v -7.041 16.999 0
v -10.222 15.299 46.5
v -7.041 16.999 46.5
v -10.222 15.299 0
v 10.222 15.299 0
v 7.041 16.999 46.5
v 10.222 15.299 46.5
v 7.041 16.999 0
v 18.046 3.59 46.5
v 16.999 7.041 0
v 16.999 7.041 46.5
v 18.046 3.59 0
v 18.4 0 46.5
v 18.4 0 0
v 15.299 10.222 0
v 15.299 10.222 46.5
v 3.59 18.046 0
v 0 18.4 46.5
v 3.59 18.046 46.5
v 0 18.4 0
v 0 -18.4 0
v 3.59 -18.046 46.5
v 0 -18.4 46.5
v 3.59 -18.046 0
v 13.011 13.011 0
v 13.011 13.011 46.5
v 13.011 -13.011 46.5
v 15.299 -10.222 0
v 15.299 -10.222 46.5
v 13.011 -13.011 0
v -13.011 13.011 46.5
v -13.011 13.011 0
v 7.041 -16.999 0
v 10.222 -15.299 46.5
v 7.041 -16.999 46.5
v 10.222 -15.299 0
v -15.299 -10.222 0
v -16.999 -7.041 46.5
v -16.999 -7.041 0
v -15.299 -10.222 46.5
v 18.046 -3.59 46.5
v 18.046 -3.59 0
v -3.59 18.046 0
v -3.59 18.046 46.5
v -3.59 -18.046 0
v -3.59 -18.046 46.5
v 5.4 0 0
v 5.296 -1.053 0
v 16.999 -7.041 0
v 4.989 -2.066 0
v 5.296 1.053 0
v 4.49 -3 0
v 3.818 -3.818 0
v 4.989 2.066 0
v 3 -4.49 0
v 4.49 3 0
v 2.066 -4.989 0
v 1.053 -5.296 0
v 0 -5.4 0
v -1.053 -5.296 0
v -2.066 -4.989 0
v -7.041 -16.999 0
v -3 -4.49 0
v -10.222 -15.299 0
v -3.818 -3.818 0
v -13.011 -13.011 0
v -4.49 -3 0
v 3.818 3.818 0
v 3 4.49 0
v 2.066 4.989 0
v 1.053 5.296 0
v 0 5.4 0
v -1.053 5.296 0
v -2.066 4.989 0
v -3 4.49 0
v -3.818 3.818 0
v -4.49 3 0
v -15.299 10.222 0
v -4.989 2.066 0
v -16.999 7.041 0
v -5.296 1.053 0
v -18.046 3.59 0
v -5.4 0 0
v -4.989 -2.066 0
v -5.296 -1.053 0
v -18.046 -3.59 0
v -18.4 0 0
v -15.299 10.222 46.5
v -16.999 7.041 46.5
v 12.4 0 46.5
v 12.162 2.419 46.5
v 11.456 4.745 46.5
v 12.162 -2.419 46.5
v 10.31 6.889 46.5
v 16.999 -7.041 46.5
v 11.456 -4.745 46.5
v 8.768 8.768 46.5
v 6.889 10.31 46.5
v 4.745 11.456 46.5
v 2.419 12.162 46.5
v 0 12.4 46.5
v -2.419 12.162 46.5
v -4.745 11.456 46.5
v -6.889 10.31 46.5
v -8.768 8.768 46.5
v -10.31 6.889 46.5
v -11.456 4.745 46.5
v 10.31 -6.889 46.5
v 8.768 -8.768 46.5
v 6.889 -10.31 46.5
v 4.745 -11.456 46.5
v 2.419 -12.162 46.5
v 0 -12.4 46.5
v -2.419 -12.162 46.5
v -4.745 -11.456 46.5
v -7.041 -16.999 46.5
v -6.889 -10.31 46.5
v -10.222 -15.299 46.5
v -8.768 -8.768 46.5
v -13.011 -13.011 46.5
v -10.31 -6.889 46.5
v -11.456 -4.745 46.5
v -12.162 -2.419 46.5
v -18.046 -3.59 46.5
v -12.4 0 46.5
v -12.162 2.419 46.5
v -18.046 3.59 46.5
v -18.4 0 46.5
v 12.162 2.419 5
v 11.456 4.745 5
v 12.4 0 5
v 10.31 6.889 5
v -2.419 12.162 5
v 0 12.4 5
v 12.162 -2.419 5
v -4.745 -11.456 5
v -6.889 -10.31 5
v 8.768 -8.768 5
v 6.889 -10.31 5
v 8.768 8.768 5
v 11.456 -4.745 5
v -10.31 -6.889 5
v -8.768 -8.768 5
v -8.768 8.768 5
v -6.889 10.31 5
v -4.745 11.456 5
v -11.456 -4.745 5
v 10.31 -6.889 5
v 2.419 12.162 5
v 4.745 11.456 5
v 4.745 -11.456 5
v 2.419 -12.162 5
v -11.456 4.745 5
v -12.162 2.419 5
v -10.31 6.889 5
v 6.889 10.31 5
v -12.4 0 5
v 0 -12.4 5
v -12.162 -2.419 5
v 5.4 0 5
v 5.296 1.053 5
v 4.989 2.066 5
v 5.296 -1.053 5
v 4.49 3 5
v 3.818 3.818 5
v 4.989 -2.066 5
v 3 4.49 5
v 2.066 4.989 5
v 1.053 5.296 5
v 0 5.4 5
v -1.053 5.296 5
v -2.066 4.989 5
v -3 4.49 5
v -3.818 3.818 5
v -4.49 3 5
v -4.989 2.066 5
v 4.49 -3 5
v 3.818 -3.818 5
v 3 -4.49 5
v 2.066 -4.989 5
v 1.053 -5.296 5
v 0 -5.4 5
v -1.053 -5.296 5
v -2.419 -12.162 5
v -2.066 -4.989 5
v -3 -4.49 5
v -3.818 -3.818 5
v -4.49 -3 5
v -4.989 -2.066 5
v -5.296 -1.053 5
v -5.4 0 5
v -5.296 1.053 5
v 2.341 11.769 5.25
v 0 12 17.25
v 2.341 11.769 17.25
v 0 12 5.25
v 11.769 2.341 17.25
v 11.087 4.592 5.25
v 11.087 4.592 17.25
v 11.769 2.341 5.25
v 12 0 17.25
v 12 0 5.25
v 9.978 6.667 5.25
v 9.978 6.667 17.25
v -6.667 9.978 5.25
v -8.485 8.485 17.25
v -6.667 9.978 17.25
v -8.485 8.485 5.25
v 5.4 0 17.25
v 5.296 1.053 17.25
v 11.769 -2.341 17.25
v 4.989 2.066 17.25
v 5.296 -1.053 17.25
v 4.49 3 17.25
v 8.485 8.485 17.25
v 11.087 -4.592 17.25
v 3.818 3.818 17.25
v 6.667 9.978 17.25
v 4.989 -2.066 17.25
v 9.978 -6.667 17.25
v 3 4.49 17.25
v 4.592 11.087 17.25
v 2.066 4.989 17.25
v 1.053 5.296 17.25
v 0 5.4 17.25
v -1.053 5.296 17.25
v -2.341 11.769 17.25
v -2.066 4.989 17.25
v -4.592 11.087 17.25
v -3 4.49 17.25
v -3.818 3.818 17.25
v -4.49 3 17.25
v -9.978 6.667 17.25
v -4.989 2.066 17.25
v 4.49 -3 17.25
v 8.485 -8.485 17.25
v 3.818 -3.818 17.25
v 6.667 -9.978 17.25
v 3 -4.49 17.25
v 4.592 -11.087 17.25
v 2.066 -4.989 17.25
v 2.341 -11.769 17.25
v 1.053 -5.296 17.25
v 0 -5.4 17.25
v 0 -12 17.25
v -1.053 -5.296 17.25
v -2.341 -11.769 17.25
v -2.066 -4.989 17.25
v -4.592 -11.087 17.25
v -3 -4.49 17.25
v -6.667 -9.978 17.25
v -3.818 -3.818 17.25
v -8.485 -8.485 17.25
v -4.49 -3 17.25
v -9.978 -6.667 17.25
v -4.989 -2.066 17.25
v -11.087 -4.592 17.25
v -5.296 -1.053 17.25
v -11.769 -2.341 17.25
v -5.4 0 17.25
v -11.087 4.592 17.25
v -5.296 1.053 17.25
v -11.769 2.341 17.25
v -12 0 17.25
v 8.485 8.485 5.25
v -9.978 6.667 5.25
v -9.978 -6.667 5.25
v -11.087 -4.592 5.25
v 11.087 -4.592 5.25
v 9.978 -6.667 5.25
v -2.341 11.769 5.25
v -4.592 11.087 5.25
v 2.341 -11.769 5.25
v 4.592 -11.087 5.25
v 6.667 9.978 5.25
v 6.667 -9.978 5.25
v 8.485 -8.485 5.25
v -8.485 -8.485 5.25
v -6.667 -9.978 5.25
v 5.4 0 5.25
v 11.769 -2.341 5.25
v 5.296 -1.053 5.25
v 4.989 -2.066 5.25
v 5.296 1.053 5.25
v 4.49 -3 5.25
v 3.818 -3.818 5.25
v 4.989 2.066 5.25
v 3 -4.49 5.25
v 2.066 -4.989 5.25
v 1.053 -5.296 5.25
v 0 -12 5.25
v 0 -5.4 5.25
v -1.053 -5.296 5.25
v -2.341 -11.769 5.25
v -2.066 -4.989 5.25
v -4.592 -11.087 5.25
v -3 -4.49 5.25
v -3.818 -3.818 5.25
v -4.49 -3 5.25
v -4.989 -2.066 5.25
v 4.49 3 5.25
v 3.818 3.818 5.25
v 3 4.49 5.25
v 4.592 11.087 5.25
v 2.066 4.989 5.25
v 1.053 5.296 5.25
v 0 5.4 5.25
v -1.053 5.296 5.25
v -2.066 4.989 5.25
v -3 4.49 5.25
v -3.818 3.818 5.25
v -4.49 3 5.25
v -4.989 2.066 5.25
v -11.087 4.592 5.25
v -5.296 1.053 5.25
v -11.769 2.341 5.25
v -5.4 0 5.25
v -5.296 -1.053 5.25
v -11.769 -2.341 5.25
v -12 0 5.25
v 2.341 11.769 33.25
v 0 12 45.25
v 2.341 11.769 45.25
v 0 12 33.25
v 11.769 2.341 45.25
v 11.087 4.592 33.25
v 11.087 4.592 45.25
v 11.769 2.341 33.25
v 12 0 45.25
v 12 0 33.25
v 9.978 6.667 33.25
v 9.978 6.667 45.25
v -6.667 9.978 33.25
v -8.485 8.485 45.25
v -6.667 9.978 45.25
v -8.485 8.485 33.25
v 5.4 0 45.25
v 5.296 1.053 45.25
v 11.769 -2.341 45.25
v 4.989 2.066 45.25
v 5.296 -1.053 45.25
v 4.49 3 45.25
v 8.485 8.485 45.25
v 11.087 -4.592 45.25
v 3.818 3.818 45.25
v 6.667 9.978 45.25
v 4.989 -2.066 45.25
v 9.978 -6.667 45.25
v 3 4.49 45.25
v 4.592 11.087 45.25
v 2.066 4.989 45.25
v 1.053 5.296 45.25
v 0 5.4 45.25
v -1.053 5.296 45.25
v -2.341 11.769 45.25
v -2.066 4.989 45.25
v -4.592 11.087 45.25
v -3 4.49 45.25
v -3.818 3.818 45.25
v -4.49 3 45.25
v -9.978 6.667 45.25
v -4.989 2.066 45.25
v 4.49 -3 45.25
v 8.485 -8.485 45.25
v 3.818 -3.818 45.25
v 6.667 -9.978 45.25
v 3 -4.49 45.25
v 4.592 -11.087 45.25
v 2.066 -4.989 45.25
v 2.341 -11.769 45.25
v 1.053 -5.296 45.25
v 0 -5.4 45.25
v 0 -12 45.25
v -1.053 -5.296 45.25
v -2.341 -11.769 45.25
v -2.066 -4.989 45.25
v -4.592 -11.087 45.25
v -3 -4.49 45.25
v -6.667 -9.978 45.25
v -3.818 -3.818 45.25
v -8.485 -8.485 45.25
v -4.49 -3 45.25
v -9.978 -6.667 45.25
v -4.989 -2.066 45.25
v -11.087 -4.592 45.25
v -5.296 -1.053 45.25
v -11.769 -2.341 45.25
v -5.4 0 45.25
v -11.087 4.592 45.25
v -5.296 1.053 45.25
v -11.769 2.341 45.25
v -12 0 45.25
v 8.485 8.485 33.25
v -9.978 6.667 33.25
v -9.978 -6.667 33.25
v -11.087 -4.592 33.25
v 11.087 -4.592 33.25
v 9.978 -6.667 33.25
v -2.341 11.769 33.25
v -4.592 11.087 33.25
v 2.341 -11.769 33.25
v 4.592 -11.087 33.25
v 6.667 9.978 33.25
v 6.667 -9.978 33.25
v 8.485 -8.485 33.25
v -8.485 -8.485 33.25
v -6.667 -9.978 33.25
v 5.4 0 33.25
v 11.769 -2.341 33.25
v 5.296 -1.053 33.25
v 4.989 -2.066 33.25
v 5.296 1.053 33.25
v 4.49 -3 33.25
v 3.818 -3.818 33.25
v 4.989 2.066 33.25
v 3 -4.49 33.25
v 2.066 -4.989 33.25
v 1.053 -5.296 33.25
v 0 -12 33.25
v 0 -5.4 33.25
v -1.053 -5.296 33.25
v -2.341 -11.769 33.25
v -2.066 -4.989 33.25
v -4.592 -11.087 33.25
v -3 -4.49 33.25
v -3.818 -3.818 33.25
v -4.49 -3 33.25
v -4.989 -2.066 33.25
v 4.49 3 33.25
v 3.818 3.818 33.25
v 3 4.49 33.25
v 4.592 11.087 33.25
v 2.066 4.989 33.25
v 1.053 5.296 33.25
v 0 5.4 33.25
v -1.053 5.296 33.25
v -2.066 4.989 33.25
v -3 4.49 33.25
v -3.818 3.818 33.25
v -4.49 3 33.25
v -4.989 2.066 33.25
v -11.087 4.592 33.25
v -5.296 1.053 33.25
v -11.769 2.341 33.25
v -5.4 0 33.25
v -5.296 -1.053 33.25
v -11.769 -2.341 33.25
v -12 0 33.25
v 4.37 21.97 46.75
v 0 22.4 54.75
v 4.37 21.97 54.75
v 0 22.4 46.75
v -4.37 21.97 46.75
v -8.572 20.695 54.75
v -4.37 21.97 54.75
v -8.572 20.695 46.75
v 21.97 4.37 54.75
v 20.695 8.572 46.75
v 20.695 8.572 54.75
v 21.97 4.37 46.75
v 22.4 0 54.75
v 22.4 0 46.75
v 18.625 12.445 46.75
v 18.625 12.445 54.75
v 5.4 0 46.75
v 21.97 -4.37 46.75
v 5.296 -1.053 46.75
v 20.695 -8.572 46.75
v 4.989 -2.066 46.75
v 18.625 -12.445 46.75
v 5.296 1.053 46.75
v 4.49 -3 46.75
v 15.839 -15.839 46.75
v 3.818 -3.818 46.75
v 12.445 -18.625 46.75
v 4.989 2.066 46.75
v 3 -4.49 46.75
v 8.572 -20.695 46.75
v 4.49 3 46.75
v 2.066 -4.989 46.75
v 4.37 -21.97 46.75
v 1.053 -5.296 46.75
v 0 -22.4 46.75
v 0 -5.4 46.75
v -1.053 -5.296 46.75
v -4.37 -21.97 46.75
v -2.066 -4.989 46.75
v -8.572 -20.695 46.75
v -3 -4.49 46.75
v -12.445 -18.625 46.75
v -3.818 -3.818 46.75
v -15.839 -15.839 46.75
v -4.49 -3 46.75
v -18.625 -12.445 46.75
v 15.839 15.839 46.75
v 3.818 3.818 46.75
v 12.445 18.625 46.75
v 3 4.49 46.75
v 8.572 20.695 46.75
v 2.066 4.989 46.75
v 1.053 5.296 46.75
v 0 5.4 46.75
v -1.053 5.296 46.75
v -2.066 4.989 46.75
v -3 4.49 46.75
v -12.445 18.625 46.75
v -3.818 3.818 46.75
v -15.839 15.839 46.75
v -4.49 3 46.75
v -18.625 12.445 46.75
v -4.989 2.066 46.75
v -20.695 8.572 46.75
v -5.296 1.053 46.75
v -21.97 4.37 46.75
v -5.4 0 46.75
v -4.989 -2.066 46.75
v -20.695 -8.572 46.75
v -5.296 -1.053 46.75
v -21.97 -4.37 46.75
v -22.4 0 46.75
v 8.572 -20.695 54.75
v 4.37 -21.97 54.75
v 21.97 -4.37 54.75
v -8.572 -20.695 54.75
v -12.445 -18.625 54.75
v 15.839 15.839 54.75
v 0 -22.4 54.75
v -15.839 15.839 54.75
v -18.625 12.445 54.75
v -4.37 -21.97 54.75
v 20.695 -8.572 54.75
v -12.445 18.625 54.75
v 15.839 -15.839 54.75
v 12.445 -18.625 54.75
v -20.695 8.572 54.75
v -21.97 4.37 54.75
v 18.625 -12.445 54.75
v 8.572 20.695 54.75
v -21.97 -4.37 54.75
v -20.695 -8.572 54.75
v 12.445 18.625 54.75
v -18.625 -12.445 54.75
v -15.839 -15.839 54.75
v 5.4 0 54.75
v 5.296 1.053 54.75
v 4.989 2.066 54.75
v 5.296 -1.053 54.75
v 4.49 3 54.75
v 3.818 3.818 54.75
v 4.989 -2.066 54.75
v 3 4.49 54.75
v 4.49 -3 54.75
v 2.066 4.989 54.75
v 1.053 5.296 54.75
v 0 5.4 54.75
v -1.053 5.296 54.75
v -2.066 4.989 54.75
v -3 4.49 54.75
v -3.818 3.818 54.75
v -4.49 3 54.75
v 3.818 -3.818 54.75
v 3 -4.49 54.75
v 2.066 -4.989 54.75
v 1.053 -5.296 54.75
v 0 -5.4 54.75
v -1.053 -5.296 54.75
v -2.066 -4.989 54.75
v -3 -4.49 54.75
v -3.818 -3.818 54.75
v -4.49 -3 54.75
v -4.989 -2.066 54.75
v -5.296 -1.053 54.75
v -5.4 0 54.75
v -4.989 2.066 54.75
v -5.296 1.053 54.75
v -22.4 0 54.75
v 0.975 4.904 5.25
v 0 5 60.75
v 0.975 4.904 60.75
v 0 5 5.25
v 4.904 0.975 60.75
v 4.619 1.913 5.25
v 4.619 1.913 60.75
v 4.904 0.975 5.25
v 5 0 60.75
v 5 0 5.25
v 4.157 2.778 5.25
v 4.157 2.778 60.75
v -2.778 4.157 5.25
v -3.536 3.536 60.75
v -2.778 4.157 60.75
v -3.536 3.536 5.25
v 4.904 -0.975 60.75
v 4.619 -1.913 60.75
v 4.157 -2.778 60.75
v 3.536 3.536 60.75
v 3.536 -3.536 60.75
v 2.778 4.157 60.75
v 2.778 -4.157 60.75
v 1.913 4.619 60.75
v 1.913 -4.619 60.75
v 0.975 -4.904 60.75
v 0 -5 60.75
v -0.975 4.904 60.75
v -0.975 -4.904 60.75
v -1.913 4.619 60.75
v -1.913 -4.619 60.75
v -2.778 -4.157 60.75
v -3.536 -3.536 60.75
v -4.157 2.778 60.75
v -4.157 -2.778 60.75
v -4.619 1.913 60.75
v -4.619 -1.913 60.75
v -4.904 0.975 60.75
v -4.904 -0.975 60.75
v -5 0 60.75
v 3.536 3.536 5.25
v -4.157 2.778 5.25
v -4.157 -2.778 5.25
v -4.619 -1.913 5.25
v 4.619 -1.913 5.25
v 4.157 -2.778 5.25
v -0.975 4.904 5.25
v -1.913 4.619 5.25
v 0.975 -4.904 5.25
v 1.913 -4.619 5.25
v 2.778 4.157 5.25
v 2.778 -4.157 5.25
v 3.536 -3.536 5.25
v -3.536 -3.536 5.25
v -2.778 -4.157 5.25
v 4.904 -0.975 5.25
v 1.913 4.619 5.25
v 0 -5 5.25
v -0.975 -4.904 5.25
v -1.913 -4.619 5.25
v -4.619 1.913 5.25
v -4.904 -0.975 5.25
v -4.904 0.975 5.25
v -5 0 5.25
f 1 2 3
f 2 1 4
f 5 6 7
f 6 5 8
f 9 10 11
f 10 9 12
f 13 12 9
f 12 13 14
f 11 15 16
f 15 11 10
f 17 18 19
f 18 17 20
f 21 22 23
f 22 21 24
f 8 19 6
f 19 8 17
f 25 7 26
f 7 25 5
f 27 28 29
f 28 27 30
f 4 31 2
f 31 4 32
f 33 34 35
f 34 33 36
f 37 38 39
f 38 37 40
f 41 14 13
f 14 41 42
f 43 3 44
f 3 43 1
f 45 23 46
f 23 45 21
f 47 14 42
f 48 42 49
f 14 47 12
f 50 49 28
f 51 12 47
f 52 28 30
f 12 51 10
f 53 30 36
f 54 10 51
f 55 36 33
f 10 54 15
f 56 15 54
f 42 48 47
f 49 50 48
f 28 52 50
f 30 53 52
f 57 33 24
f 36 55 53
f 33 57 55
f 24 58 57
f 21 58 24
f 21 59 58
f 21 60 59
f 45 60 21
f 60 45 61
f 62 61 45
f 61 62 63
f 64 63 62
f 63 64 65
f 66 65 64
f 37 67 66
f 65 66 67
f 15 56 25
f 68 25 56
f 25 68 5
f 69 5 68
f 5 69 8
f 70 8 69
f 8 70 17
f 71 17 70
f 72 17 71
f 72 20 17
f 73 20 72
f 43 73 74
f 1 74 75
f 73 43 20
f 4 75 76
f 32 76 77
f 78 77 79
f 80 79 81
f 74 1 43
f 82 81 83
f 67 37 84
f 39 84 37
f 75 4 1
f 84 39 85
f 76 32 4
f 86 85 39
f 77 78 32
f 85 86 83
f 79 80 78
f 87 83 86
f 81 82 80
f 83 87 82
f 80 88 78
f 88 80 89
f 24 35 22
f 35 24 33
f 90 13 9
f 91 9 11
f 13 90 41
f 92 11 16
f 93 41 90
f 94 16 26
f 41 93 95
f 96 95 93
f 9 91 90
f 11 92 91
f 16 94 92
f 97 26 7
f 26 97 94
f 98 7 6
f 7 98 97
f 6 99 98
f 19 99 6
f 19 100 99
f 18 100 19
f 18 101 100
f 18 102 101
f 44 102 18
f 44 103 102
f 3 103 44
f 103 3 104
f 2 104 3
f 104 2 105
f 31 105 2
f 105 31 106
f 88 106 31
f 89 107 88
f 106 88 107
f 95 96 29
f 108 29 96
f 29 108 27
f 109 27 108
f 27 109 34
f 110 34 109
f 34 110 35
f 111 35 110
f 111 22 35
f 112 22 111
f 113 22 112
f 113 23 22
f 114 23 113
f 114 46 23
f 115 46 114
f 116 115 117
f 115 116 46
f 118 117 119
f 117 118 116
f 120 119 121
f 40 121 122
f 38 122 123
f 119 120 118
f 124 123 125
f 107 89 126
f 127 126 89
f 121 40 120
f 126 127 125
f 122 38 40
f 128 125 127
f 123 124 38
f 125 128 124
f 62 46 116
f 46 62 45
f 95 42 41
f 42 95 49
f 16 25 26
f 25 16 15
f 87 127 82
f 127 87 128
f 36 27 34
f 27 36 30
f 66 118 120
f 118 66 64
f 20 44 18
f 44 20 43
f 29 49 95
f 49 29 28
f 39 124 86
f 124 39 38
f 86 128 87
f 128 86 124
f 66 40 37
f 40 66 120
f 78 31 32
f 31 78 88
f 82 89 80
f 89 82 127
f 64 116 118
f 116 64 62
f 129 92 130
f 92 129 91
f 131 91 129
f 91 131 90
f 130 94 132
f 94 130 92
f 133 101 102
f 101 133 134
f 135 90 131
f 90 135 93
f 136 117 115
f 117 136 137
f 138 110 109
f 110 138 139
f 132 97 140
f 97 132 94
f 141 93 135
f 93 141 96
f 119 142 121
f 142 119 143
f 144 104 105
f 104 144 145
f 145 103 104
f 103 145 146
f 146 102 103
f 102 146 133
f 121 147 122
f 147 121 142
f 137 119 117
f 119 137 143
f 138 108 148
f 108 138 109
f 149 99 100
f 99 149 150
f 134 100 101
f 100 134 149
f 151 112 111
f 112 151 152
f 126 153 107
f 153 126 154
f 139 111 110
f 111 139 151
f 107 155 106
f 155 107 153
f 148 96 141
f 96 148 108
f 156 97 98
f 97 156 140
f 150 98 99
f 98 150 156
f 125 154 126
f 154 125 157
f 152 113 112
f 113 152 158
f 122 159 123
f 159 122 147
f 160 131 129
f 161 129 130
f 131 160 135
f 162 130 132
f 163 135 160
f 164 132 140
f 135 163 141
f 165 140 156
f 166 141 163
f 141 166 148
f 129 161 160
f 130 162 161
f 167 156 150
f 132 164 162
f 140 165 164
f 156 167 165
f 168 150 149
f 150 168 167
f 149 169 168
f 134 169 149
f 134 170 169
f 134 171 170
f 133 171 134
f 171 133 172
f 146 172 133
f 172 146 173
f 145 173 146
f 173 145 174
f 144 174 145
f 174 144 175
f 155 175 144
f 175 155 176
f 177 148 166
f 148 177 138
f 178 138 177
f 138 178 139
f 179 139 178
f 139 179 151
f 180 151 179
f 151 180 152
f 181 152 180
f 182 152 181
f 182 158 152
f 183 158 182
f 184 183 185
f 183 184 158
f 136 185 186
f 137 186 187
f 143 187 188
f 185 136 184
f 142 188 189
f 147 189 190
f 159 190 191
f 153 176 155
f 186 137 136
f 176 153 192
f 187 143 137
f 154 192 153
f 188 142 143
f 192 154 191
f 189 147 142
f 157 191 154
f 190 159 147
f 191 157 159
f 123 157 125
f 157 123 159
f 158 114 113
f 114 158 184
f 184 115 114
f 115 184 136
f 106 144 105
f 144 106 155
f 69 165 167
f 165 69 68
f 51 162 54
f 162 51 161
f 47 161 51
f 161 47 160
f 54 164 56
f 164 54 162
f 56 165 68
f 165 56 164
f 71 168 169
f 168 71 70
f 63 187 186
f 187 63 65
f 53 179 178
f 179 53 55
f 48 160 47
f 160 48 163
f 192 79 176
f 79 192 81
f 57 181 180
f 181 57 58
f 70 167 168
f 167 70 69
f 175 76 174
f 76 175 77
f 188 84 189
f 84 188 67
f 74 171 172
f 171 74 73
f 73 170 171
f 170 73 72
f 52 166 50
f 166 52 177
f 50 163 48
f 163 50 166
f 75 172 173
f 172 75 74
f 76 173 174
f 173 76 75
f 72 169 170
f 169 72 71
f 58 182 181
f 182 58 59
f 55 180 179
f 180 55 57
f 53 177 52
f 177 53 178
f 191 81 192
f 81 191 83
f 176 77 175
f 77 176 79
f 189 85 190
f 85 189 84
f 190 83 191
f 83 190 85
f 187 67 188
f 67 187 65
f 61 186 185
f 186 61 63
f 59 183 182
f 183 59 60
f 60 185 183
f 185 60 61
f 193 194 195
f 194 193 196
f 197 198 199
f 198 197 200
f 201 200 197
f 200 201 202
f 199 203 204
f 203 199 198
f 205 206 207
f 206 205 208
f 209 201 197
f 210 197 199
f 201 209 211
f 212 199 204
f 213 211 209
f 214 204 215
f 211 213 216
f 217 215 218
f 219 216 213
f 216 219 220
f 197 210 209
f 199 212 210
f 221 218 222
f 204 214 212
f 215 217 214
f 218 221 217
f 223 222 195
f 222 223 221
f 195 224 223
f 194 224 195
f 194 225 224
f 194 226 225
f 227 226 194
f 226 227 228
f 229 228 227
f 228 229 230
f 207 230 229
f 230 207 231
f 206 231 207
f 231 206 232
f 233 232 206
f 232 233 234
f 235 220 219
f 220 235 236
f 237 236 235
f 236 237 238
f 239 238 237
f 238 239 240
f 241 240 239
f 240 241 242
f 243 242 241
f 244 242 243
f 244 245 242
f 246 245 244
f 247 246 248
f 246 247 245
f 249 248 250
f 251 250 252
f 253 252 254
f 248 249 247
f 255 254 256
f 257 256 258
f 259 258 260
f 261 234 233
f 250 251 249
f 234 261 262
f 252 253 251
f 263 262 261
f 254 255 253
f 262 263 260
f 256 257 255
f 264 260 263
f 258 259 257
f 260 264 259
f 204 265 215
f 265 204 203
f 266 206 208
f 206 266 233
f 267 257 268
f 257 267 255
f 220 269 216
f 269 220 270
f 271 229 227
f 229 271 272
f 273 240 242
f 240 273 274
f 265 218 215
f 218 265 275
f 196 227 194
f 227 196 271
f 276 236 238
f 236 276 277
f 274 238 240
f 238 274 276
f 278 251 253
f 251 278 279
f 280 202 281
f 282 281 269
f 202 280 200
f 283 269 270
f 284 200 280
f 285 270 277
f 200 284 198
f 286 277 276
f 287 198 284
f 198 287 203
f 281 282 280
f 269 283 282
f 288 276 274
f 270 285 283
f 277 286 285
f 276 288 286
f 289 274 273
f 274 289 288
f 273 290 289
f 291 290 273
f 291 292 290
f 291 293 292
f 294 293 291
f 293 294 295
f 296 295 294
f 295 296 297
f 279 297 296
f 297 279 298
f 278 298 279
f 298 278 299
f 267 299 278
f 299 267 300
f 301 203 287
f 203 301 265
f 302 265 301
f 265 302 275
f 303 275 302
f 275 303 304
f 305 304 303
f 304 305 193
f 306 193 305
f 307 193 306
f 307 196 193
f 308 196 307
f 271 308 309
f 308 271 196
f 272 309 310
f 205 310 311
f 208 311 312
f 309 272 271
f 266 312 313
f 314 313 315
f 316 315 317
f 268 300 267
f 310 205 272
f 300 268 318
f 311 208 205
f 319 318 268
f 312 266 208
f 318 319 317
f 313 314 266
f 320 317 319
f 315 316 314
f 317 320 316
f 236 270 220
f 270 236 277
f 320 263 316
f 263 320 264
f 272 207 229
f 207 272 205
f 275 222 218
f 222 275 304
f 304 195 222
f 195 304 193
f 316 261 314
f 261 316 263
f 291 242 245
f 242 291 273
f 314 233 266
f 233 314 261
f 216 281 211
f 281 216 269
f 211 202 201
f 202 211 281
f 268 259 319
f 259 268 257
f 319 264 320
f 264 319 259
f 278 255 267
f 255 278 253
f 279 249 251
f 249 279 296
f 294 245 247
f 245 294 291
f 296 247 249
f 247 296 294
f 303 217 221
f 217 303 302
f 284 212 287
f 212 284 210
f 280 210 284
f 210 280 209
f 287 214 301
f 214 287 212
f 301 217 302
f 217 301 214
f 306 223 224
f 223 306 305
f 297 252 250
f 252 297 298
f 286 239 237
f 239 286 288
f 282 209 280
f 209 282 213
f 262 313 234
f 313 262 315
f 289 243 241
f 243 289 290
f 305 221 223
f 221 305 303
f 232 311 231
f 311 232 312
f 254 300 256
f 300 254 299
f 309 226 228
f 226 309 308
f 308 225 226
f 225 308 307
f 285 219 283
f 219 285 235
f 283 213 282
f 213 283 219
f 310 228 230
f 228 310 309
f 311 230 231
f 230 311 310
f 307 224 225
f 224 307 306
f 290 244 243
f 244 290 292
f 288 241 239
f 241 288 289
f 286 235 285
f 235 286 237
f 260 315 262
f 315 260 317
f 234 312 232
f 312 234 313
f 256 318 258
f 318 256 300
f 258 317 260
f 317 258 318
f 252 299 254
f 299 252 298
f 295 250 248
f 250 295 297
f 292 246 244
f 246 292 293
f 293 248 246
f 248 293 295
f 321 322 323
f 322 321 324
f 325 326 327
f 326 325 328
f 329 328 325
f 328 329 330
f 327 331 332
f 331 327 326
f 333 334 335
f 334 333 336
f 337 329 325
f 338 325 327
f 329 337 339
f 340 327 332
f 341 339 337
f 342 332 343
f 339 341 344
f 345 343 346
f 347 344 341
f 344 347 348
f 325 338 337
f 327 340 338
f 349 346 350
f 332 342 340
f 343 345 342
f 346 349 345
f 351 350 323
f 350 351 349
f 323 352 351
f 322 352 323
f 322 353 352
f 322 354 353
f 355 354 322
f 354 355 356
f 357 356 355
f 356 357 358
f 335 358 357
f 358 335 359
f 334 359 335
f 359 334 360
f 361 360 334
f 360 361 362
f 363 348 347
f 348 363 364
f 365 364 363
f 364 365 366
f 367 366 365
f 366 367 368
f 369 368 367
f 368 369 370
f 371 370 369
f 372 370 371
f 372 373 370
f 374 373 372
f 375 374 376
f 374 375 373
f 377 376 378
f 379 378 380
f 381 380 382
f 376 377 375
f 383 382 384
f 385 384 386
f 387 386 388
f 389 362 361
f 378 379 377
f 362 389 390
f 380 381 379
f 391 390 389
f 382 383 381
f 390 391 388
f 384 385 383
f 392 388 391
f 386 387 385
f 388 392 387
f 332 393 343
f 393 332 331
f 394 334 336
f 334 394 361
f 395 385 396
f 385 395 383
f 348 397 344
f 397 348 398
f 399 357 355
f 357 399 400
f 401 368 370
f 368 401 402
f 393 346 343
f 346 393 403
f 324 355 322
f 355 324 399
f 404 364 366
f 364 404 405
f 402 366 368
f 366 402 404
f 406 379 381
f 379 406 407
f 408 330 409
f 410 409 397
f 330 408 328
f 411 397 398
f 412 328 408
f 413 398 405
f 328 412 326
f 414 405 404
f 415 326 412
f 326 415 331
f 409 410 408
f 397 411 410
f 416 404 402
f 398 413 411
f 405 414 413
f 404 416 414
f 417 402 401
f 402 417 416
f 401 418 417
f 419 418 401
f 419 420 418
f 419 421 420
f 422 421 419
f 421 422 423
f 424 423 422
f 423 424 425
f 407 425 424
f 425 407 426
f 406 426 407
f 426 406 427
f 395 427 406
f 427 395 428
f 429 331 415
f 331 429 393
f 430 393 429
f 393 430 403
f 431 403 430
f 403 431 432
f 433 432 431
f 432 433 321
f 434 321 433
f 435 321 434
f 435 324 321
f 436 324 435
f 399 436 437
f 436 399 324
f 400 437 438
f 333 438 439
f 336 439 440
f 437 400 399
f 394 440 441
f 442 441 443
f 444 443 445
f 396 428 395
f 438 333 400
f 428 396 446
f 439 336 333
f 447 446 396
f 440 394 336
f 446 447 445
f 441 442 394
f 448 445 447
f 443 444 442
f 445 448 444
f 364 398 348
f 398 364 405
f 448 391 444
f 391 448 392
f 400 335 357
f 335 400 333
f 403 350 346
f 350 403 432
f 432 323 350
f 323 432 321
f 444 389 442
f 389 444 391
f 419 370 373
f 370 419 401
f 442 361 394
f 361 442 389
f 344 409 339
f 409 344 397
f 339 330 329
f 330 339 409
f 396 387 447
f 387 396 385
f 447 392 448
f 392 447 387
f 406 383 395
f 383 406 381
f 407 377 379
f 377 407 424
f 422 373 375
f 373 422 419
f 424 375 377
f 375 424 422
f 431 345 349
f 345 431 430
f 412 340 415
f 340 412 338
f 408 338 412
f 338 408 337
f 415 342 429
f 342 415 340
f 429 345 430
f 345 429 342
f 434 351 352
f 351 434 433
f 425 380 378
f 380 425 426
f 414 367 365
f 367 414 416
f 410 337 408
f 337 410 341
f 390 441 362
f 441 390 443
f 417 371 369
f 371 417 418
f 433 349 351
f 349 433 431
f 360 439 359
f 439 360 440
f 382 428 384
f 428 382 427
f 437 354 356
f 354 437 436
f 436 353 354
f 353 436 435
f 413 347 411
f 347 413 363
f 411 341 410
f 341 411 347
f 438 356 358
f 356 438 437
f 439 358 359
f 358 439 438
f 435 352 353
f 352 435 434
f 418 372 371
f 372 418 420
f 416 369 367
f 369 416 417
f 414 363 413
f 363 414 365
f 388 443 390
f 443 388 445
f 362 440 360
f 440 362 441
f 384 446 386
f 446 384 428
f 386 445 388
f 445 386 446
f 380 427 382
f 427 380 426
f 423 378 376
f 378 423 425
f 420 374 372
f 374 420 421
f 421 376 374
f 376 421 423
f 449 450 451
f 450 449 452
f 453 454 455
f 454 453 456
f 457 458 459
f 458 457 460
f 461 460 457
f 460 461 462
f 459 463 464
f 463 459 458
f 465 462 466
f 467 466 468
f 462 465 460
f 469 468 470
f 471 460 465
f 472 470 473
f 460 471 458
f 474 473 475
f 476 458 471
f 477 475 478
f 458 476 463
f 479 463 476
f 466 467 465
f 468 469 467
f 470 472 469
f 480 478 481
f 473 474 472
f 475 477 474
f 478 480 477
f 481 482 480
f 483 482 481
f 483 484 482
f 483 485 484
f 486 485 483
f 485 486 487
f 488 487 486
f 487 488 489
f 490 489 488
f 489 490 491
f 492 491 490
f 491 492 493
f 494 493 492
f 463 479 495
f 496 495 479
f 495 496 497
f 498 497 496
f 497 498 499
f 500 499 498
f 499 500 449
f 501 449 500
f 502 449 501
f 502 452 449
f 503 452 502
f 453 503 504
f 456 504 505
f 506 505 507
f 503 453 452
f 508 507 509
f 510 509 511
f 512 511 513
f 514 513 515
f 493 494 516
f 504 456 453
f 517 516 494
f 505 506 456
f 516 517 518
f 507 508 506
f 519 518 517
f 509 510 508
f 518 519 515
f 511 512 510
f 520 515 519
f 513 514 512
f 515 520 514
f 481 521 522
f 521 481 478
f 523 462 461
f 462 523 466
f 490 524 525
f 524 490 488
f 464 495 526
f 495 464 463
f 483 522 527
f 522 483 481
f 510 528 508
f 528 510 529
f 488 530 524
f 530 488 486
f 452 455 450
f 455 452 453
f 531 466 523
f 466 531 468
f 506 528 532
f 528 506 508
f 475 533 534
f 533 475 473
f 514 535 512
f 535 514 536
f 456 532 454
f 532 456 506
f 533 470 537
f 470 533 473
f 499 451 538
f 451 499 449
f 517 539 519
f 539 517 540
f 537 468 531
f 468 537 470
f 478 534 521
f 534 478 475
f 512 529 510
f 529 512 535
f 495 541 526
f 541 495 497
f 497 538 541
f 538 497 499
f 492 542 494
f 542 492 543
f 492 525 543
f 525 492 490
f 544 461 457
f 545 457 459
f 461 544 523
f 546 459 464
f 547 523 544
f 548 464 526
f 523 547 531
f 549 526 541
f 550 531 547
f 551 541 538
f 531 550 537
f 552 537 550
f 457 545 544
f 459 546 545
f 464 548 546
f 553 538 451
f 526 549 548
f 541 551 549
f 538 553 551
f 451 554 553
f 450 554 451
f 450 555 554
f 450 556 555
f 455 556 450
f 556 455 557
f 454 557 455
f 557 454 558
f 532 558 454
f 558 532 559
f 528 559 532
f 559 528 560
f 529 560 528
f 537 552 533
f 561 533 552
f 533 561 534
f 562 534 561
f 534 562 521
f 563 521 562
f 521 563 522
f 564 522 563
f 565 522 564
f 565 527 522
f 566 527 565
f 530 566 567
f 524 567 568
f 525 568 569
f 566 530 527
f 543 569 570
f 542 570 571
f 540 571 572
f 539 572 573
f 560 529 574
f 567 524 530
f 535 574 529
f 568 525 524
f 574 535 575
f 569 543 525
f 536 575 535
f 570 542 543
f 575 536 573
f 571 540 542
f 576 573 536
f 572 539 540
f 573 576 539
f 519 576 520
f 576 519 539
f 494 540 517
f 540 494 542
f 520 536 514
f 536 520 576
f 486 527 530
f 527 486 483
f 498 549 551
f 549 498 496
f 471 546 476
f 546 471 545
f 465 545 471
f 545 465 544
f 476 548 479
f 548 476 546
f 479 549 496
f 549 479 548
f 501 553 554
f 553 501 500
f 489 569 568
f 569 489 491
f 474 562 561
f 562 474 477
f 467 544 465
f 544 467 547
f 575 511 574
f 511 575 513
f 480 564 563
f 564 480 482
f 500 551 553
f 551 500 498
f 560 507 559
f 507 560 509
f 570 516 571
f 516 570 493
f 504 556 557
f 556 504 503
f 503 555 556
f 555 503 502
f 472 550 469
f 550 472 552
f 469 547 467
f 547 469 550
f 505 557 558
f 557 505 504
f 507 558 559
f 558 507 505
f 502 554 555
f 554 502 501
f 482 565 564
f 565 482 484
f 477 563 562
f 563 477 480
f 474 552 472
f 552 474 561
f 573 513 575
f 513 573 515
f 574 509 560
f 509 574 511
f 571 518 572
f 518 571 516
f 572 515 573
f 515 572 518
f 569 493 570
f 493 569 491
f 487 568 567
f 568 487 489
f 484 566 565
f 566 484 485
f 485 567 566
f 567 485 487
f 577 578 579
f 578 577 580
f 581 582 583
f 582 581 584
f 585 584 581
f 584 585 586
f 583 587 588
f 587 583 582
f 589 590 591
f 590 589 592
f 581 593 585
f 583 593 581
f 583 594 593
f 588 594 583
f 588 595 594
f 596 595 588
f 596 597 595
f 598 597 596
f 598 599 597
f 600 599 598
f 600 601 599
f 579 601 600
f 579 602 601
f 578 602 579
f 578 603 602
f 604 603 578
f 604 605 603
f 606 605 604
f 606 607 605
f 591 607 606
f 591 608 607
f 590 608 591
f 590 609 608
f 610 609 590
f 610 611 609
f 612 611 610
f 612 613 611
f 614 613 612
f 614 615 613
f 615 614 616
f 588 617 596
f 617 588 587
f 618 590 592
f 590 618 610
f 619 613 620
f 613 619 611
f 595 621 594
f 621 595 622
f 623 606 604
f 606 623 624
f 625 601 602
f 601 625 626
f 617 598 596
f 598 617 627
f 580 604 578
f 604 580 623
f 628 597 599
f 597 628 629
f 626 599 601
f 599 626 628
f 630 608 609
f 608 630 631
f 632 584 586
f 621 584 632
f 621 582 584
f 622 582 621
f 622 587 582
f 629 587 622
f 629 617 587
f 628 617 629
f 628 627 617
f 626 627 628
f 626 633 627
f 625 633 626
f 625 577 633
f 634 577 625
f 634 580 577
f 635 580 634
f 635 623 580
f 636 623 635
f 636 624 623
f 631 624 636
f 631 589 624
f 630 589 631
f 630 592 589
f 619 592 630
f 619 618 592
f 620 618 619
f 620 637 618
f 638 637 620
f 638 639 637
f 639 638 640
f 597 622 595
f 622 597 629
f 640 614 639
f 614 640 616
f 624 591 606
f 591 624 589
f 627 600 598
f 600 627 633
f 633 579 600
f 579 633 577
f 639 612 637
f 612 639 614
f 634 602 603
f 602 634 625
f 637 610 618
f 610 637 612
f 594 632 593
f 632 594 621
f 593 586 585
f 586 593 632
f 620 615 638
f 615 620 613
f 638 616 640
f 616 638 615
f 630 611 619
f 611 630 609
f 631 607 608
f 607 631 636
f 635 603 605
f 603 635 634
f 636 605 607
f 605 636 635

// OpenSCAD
$fn = 32;

// ------------------------------------------------------------------------
// Shaft station: cup d36.8 x 46.5 mm, shaft d10
// Every part is its own module, assembly() places every instance.
// ------------------------------------------------------------------------

// --- part 1 ---
module housing_cup() {
  difference() {
    cylinder(h = 46.5, d = 36.8);
    translate([0, 0, 5]) cylinder(h = 42.5, d = 24.8);
    translate([0, 0, -1]) cylinder(h = 7, d = 10.8);
  }
}

// --- part 2 ---
module bearing_lower() {
  difference() {
      translate([0, 0, 0]) cylinder(h = 12, d = 24);
      translate([0, 0, -1]) cylinder(h = 14, d = 10.8);
    }
}

// --- part 3 ---
module bearing_upper() {
  difference() {
      translate([0, 0, 0]) cylinder(h = 12, d = 24);
      translate([0, 0, -1]) cylinder(h = 14, d = 10.8);
    }
}

// --- part 4 ---
module station_shaft() {
  translate([0, 0, -27.75]) cylinder(h = 55.5, d = 10);
}

// --- part 5 ---
module station_cover() {
  difference() {
    cylinder(h = 8, d = 44.8);
    translate([0, 0, -1]) cylinder(h = 10, d = 10.8);
  }
}

// --- assembly ---
module assembly() {
  color([0.80, 0.24, 0.20]) translate([0, 0, 0]) rotate([0, 0, 0]) housing_cup();
  color([0.20, 0.45, 0.75]) translate([0, 0, 5.25]) rotate([0, 0, 0]) bearing_lower();
  color([0.25, 0.62, 0.32]) translate([0, 0, 33.25]) rotate([0, 0, 0]) bearing_upper();
  color([0.92, 0.70, 0.18]) translate([0, 0, 33]) rotate([0, 0, 0]) station_shaft();
  color([0.58, 0.35, 0.70]) translate([0, 0, 46.75]) rotate([0, 0, 0]) station_cover();
}

assembly();
